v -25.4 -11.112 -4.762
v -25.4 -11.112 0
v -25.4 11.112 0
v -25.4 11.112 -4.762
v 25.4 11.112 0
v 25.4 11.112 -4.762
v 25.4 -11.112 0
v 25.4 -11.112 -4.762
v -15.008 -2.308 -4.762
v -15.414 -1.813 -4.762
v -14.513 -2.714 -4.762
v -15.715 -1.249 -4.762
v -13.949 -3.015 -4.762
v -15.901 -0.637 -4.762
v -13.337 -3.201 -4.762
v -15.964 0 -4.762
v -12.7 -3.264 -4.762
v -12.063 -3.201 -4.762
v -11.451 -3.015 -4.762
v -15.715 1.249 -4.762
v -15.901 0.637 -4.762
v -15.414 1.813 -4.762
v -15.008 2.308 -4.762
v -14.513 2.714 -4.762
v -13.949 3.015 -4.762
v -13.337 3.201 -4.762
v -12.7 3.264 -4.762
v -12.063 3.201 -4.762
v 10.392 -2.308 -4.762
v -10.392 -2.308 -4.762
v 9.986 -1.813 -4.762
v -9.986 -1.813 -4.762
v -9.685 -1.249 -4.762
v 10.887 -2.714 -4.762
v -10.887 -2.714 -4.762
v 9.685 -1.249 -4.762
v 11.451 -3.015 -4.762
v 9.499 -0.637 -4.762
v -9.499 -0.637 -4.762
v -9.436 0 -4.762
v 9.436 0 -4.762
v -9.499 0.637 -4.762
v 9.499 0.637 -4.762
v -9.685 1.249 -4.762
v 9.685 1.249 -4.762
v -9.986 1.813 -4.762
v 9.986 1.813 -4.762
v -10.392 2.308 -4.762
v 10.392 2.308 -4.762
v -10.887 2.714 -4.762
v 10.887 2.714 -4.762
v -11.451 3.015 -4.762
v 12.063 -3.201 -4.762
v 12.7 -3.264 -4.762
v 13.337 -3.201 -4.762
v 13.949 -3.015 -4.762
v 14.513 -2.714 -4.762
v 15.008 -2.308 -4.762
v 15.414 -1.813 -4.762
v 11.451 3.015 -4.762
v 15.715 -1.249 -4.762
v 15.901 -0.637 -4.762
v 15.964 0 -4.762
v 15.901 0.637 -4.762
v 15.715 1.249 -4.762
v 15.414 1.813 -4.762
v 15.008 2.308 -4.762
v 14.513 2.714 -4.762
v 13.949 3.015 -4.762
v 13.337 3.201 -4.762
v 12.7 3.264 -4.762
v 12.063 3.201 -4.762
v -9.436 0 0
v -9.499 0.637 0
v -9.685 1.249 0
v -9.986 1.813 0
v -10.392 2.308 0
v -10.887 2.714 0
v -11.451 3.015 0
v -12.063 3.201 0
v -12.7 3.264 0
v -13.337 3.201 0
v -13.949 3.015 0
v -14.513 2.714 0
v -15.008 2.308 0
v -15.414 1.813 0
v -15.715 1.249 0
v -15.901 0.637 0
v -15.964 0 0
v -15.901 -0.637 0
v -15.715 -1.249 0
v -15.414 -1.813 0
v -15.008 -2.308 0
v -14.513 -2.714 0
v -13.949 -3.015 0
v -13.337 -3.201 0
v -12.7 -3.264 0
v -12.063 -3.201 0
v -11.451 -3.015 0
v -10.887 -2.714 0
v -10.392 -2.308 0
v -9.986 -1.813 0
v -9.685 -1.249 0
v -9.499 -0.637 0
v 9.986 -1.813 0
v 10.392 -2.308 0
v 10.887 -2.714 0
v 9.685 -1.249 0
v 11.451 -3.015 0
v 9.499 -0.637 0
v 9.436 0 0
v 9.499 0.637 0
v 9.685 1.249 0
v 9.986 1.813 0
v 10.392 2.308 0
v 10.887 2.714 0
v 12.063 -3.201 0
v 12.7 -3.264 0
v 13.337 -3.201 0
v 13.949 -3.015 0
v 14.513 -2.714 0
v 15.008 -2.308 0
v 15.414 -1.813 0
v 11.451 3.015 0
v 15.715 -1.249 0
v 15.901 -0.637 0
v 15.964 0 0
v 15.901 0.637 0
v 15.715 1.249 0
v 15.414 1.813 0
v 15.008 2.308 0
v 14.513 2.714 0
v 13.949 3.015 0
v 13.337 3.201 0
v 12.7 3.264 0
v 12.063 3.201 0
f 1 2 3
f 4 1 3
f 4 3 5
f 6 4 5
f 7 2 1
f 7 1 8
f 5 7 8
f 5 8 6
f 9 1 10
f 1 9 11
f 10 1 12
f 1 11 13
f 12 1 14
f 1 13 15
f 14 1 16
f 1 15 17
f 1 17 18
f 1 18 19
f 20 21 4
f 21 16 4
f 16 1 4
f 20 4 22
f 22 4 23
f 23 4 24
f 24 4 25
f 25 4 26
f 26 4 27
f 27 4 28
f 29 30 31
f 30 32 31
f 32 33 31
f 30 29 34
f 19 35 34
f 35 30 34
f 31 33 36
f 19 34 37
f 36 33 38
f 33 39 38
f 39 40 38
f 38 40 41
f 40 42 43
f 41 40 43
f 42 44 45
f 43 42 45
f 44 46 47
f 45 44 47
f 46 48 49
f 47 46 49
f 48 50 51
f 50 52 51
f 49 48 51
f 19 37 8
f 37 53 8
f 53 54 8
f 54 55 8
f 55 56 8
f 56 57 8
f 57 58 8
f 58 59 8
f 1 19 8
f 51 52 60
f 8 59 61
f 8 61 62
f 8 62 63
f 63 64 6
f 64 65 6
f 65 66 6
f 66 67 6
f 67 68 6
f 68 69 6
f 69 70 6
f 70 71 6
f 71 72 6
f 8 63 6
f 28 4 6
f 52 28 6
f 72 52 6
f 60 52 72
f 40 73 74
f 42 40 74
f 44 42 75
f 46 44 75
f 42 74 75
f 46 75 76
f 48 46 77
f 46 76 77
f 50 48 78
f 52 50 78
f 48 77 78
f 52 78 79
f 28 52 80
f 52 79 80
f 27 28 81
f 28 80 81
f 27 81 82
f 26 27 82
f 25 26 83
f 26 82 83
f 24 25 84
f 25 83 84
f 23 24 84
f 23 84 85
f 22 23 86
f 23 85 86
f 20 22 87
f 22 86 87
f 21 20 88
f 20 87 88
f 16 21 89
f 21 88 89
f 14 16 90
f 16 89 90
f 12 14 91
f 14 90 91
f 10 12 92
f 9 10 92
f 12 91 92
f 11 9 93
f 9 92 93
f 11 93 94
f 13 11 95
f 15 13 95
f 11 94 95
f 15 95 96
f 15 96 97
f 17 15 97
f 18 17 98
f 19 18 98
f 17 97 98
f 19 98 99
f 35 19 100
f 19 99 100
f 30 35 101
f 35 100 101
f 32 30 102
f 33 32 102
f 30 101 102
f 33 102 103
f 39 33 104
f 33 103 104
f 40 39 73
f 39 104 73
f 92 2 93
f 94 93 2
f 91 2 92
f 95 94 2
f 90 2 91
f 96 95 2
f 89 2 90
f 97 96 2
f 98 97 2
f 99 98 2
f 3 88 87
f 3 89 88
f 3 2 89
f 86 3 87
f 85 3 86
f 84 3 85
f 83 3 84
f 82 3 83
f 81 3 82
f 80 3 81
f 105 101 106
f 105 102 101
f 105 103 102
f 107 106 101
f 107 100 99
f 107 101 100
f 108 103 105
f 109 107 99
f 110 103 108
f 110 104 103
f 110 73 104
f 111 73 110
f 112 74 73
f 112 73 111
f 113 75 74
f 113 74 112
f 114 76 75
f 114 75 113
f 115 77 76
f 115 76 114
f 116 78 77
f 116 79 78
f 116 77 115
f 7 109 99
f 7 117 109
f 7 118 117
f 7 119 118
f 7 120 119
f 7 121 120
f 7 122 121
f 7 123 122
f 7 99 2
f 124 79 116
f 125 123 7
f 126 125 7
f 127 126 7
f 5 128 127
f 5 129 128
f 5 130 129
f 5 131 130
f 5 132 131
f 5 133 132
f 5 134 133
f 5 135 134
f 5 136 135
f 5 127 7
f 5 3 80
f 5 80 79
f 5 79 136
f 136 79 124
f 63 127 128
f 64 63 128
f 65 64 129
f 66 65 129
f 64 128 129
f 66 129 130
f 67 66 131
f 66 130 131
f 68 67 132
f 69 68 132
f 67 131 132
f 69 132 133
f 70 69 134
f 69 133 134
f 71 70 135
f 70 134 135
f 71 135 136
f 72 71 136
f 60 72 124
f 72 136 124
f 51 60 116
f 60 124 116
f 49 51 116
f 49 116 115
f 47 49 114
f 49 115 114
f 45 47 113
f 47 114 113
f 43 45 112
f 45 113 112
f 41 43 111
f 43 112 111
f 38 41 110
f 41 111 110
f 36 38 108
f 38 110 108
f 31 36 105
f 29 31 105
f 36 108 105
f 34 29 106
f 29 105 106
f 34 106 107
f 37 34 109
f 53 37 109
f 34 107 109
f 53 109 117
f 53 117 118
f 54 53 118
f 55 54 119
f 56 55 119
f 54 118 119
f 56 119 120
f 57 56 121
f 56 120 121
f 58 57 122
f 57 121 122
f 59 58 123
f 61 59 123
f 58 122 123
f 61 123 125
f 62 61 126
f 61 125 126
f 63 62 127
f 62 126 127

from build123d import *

# Parameters (mm, degrees)
SKETCH1_W      = 50.8
SKETCH1_H      = 22.225
SKETCH1_R      = 3.2639
EXTRUDE1_DEPTH = 4.7625


with BuildPart() as part:
    # Sketch1 → Extrude1 (new body)
    with BuildSketch(Plane.XY):
        Rectangle(SKETCH1_W, SKETCH1_H)
        with Locations((12.7, 0)):
            Circle(SKETCH1_R, mode=Mode.SUBTRACT)
        with Locations((-12.7, 0)):
            Circle(SKETCH1_R, mode=Mode.SUBTRACT)
    extrude(amount=-EXTRUDE1_DEPTH)


solid = part.part
